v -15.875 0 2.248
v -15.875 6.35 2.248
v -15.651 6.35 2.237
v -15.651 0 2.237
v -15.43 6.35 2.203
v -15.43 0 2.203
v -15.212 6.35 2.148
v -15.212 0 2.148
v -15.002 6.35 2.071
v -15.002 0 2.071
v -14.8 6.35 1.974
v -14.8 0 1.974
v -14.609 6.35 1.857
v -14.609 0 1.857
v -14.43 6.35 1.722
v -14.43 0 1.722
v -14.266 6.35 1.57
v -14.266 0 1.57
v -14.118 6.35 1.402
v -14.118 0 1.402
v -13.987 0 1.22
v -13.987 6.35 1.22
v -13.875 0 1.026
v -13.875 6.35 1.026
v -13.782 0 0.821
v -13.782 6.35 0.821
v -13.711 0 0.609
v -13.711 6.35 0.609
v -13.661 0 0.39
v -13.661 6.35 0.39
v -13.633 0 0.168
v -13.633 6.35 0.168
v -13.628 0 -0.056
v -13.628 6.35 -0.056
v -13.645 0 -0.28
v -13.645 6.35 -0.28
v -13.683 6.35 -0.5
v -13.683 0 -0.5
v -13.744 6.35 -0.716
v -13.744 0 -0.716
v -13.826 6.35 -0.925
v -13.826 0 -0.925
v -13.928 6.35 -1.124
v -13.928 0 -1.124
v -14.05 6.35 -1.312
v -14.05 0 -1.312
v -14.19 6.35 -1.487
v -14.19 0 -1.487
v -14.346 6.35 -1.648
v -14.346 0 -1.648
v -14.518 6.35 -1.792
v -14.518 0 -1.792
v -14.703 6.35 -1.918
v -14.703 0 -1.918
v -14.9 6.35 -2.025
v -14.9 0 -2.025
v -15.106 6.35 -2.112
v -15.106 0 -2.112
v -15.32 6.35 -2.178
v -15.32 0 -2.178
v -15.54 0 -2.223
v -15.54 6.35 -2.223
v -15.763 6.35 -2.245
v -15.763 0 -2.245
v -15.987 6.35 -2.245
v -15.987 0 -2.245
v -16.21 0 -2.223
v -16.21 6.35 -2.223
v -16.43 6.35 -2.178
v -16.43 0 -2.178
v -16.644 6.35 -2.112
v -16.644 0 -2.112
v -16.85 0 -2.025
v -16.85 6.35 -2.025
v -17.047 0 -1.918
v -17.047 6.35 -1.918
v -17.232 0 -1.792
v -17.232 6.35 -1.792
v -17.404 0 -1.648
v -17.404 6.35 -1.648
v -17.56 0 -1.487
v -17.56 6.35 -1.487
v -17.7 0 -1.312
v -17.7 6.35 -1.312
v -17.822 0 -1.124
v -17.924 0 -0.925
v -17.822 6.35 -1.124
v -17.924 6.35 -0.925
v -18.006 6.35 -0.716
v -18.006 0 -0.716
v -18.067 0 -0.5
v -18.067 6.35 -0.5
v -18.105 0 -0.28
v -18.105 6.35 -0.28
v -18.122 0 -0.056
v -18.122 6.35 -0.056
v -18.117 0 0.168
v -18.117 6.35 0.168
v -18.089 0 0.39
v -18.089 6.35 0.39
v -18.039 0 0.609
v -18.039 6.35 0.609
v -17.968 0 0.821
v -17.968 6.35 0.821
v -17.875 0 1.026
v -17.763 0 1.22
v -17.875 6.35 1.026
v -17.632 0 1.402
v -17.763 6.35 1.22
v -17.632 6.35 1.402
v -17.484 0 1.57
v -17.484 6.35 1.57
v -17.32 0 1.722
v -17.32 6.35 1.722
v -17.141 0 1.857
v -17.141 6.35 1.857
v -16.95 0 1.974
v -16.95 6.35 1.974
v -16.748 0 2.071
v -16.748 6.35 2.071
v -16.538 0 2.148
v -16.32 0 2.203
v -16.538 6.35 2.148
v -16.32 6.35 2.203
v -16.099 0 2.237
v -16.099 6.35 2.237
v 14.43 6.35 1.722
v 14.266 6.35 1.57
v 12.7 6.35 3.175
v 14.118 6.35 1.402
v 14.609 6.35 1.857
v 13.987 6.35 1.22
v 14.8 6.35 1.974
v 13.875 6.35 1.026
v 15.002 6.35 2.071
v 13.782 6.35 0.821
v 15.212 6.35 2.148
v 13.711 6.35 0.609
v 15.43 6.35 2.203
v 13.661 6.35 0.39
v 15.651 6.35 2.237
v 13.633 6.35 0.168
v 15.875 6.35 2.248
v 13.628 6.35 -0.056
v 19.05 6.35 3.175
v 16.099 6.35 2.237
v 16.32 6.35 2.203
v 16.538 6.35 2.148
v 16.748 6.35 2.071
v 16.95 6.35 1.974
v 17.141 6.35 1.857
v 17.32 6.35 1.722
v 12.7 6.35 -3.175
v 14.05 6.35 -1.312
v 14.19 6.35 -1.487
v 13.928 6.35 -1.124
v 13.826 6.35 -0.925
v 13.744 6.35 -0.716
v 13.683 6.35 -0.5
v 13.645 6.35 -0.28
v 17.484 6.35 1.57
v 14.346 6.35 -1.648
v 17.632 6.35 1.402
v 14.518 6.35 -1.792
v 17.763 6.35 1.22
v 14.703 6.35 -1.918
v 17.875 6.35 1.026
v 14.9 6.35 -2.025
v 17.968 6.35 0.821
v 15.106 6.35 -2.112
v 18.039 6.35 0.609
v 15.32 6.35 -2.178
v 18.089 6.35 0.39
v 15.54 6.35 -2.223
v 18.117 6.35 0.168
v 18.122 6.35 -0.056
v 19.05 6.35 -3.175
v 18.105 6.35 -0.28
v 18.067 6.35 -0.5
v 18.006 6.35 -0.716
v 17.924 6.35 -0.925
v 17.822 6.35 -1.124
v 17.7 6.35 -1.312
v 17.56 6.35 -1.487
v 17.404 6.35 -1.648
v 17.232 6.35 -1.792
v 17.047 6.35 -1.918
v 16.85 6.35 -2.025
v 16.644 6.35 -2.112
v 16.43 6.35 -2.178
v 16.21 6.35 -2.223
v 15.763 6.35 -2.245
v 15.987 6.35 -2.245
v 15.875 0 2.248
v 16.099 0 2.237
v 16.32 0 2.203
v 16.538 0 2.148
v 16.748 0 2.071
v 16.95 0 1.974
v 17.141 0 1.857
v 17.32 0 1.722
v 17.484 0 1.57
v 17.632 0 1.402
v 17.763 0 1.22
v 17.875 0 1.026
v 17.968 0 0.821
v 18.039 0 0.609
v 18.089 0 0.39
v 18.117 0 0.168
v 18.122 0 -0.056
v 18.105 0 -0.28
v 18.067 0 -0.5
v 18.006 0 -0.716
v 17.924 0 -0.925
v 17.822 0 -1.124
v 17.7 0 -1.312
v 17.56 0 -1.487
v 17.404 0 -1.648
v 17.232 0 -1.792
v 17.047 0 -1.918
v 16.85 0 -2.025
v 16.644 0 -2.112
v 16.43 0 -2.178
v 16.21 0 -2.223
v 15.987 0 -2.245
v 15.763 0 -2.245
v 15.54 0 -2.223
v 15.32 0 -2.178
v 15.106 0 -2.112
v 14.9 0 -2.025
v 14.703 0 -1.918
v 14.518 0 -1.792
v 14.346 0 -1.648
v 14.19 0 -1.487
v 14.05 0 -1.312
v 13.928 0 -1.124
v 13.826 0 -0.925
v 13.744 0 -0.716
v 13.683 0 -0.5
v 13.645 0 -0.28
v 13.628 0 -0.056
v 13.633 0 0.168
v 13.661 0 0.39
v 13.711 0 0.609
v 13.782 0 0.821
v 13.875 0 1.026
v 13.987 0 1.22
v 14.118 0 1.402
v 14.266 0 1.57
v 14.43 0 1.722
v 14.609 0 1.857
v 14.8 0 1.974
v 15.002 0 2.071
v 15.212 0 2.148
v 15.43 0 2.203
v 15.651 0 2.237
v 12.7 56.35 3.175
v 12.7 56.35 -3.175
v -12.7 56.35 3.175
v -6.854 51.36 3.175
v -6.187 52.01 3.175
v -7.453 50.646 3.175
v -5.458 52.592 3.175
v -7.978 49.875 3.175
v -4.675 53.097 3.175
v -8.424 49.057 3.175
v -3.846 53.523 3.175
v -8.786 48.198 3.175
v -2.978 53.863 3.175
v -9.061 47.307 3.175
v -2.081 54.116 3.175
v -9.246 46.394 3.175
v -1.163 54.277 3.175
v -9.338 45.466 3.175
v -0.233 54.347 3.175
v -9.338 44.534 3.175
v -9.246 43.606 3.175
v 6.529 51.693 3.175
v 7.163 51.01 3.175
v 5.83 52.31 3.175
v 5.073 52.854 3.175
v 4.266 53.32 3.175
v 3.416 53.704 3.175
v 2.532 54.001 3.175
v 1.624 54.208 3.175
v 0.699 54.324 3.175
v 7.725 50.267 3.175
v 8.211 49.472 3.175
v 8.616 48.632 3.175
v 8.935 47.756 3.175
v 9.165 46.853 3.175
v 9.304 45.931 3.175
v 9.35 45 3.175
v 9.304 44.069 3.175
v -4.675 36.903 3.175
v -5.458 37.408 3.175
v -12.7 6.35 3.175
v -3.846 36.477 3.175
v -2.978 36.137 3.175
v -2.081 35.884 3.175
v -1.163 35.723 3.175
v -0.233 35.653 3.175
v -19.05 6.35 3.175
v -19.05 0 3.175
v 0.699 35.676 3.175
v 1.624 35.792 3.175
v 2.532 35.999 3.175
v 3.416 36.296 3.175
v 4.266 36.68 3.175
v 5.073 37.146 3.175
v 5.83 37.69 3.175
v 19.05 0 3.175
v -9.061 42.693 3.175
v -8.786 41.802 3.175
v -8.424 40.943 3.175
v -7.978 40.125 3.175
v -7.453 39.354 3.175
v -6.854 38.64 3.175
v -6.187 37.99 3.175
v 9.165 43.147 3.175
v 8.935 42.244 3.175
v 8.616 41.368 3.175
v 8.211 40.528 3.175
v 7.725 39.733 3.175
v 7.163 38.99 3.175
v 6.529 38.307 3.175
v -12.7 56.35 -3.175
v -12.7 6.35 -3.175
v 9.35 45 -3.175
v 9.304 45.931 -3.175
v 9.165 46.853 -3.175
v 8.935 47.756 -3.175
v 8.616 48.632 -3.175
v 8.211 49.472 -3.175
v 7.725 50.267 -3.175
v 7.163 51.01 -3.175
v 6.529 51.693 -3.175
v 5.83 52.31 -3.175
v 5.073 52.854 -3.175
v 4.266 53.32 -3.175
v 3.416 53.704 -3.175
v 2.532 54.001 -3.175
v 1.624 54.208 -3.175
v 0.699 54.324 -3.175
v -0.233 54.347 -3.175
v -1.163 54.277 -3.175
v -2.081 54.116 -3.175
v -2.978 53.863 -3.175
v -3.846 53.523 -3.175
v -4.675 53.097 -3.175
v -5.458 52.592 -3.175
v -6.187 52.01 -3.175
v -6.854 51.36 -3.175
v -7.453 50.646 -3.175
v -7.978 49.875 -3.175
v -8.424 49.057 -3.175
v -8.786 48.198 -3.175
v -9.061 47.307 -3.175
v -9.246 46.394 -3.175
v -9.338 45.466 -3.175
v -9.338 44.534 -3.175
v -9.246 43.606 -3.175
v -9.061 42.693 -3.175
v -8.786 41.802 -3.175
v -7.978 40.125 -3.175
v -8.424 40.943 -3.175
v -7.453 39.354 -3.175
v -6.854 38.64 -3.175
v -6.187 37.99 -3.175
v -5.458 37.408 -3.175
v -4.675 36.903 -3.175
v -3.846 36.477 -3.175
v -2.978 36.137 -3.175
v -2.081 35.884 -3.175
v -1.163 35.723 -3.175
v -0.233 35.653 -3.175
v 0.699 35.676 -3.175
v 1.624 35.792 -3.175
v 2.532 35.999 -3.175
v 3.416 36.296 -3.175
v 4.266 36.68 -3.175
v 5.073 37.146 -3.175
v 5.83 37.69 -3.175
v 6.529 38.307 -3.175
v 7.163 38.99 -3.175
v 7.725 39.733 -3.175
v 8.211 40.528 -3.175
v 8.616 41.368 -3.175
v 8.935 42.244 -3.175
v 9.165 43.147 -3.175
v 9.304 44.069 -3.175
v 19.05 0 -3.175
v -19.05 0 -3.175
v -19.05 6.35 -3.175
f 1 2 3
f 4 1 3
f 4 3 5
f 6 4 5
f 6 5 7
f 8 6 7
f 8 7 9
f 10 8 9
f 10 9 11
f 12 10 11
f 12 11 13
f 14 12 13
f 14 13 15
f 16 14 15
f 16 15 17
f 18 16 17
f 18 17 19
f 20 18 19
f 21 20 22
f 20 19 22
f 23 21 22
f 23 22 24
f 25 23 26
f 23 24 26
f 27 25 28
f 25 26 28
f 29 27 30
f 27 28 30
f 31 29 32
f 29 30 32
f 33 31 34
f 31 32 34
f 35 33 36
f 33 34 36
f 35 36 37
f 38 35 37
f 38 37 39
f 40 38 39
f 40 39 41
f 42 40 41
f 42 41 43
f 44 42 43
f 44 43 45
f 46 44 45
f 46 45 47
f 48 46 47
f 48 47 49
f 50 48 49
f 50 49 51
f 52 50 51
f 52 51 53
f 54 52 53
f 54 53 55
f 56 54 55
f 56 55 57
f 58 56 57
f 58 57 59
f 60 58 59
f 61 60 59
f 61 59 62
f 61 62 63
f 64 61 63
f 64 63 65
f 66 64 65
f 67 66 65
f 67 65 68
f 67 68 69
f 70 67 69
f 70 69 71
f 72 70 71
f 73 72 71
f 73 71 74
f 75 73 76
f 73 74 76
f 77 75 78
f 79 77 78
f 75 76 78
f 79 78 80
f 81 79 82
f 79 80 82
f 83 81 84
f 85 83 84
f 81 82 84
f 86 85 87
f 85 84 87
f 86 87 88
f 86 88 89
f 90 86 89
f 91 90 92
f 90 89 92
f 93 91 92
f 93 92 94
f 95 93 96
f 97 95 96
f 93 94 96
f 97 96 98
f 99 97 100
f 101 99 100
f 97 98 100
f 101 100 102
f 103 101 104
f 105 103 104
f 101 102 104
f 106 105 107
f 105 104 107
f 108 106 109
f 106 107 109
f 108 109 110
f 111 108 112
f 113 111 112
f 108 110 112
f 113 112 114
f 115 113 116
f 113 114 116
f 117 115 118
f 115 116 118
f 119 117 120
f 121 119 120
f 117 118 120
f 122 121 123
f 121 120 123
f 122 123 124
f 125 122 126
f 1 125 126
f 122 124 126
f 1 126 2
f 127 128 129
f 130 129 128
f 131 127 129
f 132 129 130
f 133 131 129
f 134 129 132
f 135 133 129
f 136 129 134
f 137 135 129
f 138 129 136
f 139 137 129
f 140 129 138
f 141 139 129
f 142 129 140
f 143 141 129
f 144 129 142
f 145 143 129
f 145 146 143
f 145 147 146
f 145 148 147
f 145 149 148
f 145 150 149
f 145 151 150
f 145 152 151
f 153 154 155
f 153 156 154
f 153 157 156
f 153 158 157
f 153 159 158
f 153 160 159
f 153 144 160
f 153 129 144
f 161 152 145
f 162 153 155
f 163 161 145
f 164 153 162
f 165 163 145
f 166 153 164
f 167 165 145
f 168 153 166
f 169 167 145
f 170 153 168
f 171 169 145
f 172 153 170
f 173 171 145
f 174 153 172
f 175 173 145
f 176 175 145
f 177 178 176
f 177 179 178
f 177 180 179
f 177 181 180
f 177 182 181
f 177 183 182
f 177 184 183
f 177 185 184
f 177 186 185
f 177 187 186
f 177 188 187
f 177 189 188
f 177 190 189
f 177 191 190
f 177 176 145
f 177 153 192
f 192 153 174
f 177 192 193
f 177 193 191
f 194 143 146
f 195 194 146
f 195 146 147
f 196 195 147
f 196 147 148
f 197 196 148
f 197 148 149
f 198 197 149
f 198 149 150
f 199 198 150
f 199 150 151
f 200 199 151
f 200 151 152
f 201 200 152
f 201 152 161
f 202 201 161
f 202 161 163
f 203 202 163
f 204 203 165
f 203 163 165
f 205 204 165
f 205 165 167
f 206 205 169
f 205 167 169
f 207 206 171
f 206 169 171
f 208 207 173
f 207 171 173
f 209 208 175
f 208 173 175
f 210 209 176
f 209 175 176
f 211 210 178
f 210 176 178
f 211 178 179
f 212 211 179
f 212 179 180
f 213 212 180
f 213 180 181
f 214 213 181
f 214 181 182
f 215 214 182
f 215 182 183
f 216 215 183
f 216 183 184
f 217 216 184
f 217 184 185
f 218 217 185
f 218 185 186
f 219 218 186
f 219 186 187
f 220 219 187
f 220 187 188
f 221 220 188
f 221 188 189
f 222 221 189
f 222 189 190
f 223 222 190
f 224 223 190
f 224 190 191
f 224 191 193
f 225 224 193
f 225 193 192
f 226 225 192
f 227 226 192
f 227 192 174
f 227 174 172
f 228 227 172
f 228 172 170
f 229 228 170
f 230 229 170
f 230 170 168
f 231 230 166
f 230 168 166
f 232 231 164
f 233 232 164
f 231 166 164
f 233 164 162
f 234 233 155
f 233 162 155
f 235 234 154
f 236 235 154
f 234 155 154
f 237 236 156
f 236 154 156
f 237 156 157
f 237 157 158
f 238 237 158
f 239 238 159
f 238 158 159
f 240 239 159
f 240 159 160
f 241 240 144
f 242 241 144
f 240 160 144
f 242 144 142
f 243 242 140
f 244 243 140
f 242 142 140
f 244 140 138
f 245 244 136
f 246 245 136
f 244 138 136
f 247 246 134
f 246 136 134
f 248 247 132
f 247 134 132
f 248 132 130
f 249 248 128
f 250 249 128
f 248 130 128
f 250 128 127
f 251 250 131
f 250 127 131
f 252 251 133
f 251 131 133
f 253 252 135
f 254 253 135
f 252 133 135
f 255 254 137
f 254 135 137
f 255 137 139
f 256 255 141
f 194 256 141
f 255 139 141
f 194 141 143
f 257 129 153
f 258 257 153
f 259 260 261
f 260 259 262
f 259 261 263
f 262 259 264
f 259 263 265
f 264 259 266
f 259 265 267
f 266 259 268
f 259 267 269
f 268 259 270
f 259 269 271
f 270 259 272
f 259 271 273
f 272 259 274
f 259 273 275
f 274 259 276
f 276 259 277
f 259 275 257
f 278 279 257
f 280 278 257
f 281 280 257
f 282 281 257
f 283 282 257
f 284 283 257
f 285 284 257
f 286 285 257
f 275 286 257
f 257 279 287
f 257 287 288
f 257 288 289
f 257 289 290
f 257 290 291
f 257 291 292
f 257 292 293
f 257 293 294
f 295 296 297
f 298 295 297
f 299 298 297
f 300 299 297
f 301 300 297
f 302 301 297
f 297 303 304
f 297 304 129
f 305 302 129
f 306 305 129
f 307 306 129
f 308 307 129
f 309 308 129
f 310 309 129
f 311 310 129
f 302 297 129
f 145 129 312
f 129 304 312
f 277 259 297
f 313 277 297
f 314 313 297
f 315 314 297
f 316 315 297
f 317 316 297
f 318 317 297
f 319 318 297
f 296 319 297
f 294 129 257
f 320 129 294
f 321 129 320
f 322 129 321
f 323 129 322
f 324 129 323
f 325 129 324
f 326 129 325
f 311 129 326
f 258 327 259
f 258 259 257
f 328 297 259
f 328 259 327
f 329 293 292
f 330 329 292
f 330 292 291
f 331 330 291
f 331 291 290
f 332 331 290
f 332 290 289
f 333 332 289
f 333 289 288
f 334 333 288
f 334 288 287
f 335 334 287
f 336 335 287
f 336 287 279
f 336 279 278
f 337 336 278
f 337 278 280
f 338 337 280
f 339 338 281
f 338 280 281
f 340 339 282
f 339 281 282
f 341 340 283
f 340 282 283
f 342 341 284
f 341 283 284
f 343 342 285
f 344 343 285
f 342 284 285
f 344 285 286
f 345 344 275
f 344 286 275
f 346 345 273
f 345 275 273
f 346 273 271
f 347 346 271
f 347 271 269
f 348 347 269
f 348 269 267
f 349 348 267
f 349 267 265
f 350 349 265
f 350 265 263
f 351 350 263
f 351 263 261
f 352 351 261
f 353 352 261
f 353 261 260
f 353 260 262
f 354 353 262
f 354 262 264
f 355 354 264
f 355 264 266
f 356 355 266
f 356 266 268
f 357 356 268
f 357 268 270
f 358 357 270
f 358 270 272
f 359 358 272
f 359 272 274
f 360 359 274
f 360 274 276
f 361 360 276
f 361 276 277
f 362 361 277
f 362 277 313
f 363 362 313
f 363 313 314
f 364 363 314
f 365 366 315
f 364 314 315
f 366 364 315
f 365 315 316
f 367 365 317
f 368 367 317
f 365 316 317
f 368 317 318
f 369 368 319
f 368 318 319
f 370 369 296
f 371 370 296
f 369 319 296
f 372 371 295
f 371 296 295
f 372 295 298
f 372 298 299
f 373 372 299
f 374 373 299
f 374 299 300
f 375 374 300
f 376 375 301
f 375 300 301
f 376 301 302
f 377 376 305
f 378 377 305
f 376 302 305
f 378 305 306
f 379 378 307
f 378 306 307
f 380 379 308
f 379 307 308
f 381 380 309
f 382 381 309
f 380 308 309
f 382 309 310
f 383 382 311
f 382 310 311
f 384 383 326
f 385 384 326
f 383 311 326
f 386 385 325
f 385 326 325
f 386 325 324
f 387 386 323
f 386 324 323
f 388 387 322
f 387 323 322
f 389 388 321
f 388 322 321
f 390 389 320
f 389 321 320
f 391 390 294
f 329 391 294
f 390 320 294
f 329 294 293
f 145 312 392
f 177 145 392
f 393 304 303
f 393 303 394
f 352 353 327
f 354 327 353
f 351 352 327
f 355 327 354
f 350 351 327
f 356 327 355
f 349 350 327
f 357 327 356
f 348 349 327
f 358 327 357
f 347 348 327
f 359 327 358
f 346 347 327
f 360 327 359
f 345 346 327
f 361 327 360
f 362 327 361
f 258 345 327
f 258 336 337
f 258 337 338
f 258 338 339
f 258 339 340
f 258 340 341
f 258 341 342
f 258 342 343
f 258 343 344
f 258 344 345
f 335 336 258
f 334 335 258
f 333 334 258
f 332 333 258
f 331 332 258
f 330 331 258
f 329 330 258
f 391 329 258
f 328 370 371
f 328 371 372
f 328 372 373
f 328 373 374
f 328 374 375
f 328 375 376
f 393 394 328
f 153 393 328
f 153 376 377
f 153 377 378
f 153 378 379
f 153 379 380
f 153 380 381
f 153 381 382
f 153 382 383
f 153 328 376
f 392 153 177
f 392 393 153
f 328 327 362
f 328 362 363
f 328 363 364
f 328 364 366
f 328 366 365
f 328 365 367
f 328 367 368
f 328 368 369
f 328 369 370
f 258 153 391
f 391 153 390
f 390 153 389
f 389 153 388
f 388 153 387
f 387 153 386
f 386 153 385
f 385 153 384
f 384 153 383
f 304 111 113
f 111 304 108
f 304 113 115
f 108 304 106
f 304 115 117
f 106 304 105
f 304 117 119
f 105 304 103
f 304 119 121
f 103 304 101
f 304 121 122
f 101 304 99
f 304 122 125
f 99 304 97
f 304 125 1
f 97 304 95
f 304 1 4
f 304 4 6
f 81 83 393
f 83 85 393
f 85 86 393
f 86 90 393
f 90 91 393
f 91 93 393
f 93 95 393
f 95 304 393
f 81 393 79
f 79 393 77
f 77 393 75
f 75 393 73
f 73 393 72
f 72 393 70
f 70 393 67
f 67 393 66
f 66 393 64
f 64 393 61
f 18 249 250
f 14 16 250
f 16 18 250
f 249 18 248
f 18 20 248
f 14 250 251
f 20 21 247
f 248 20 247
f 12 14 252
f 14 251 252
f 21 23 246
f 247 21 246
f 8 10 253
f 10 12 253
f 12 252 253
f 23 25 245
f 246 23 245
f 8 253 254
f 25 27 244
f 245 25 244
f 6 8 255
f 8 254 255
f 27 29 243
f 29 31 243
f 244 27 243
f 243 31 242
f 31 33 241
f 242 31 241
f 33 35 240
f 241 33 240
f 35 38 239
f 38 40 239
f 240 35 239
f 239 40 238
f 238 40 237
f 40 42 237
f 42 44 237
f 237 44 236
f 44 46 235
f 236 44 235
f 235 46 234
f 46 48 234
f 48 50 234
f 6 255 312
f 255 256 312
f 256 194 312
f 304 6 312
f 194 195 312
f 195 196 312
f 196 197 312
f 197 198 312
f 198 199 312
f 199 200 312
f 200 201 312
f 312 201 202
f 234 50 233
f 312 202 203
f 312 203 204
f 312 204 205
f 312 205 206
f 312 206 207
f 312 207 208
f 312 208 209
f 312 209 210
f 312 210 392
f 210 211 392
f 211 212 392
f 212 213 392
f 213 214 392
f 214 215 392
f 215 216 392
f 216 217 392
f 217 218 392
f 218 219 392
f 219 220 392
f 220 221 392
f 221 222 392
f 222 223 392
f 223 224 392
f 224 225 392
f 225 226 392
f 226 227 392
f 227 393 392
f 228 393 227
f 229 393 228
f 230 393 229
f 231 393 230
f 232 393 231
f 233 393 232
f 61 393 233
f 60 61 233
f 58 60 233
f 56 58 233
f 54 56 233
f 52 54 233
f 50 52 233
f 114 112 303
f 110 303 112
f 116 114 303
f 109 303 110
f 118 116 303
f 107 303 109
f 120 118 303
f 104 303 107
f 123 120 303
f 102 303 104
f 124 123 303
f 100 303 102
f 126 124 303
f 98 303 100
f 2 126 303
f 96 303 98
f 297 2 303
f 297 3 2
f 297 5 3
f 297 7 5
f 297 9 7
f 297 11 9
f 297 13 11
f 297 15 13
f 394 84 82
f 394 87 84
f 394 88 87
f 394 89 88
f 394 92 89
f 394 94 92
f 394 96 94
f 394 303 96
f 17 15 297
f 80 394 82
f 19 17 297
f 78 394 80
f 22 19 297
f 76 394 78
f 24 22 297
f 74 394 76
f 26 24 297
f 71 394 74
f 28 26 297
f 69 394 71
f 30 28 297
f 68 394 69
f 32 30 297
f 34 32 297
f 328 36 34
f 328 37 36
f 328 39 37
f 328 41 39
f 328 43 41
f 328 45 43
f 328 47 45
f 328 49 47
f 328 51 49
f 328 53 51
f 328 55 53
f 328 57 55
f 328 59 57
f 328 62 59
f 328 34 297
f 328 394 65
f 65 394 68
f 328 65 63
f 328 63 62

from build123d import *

# Parameters (mm, degrees)
SKETCH1_W           = 38.1
SKETCH1_H           = 6.35
BOSS_EXTRUDE1_DEPTH = 6.35
SKETCH3_W           = 25.4
SKETCH3_H           = 6.35
BOSS_EXTRUDE2_DEPTH = 50
SKETCH6_R           = 9.35
CUT_EXTRUDE3_DEPTH  = 60.820962045
SKETCH4_R           = 2.2479
CUT_EXTRUDE1_DEPTH  = 54.600215718
SKETCH5_R           = 9.017
CUT_EXTRUDE2_DEPTH  = 60.820962045


with BuildPart() as part:
    # Sketch1 → Boss-Extrude1 (new body)
    with BuildSketch(Plane(origin=(0, 0, 0), x_dir=(1, 0, 0), z_dir=(0, 1, 0))):
        Rectangle(SKETCH1_W, SKETCH1_H)
    extrude(amount=BOSS_EXTRUDE1_DEPTH)

    # Sketch3 → Boss-Extrude2 (add)
    with BuildSketch(Plane(origin=(0, 6.35, 0), x_dir=(1, 0, 0), z_dir=(0, 1, 0))):
        Rectangle(SKETCH3_W, SKETCH3_H)
    extrude(amount=BOSS_EXTRUDE2_DEPTH)

    # Sketch6 → Cut-Extrude3 (cut, through all)
    with BuildSketch(Plane.XY.offset(3.175)):
        with Locations((0, 45)):
            Circle(SKETCH6_R)
    extrude(amount=-CUT_EXTRUDE3_DEPTH, mode=Mode.SUBTRACT)

    # Sketch4 → Cut-Extrude1 (cut, through all)
    with BuildSketch(Plane(origin=(0, 6.35, 0), x_dir=(1, 0, 0), z_dir=(0, 1, 0))):
        with Locations(Location((-15.875, 0, 0), (0, 0, 270))):
            Circle(SKETCH4_R)
        with Locations(Location((15.875, 0, 0), (0, 0, 270))):
            Circle(SKETCH4_R)
    extrude(amount=-CUT_EXTRUDE1_DEPTH, mode=Mode.SUBTRACT)

    # Sketch5 → Cut-Extrude2 (cut, through all)
    with BuildSketch(Plane.XY.offset(3.175)):
        with Locations((0, 45.25679453)):
            Circle(SKETCH5_R)
    extrude(amount=-CUT_EXTRUDE2_DEPTH, mode=Mode.SUBTRACT)


solid = part.part
